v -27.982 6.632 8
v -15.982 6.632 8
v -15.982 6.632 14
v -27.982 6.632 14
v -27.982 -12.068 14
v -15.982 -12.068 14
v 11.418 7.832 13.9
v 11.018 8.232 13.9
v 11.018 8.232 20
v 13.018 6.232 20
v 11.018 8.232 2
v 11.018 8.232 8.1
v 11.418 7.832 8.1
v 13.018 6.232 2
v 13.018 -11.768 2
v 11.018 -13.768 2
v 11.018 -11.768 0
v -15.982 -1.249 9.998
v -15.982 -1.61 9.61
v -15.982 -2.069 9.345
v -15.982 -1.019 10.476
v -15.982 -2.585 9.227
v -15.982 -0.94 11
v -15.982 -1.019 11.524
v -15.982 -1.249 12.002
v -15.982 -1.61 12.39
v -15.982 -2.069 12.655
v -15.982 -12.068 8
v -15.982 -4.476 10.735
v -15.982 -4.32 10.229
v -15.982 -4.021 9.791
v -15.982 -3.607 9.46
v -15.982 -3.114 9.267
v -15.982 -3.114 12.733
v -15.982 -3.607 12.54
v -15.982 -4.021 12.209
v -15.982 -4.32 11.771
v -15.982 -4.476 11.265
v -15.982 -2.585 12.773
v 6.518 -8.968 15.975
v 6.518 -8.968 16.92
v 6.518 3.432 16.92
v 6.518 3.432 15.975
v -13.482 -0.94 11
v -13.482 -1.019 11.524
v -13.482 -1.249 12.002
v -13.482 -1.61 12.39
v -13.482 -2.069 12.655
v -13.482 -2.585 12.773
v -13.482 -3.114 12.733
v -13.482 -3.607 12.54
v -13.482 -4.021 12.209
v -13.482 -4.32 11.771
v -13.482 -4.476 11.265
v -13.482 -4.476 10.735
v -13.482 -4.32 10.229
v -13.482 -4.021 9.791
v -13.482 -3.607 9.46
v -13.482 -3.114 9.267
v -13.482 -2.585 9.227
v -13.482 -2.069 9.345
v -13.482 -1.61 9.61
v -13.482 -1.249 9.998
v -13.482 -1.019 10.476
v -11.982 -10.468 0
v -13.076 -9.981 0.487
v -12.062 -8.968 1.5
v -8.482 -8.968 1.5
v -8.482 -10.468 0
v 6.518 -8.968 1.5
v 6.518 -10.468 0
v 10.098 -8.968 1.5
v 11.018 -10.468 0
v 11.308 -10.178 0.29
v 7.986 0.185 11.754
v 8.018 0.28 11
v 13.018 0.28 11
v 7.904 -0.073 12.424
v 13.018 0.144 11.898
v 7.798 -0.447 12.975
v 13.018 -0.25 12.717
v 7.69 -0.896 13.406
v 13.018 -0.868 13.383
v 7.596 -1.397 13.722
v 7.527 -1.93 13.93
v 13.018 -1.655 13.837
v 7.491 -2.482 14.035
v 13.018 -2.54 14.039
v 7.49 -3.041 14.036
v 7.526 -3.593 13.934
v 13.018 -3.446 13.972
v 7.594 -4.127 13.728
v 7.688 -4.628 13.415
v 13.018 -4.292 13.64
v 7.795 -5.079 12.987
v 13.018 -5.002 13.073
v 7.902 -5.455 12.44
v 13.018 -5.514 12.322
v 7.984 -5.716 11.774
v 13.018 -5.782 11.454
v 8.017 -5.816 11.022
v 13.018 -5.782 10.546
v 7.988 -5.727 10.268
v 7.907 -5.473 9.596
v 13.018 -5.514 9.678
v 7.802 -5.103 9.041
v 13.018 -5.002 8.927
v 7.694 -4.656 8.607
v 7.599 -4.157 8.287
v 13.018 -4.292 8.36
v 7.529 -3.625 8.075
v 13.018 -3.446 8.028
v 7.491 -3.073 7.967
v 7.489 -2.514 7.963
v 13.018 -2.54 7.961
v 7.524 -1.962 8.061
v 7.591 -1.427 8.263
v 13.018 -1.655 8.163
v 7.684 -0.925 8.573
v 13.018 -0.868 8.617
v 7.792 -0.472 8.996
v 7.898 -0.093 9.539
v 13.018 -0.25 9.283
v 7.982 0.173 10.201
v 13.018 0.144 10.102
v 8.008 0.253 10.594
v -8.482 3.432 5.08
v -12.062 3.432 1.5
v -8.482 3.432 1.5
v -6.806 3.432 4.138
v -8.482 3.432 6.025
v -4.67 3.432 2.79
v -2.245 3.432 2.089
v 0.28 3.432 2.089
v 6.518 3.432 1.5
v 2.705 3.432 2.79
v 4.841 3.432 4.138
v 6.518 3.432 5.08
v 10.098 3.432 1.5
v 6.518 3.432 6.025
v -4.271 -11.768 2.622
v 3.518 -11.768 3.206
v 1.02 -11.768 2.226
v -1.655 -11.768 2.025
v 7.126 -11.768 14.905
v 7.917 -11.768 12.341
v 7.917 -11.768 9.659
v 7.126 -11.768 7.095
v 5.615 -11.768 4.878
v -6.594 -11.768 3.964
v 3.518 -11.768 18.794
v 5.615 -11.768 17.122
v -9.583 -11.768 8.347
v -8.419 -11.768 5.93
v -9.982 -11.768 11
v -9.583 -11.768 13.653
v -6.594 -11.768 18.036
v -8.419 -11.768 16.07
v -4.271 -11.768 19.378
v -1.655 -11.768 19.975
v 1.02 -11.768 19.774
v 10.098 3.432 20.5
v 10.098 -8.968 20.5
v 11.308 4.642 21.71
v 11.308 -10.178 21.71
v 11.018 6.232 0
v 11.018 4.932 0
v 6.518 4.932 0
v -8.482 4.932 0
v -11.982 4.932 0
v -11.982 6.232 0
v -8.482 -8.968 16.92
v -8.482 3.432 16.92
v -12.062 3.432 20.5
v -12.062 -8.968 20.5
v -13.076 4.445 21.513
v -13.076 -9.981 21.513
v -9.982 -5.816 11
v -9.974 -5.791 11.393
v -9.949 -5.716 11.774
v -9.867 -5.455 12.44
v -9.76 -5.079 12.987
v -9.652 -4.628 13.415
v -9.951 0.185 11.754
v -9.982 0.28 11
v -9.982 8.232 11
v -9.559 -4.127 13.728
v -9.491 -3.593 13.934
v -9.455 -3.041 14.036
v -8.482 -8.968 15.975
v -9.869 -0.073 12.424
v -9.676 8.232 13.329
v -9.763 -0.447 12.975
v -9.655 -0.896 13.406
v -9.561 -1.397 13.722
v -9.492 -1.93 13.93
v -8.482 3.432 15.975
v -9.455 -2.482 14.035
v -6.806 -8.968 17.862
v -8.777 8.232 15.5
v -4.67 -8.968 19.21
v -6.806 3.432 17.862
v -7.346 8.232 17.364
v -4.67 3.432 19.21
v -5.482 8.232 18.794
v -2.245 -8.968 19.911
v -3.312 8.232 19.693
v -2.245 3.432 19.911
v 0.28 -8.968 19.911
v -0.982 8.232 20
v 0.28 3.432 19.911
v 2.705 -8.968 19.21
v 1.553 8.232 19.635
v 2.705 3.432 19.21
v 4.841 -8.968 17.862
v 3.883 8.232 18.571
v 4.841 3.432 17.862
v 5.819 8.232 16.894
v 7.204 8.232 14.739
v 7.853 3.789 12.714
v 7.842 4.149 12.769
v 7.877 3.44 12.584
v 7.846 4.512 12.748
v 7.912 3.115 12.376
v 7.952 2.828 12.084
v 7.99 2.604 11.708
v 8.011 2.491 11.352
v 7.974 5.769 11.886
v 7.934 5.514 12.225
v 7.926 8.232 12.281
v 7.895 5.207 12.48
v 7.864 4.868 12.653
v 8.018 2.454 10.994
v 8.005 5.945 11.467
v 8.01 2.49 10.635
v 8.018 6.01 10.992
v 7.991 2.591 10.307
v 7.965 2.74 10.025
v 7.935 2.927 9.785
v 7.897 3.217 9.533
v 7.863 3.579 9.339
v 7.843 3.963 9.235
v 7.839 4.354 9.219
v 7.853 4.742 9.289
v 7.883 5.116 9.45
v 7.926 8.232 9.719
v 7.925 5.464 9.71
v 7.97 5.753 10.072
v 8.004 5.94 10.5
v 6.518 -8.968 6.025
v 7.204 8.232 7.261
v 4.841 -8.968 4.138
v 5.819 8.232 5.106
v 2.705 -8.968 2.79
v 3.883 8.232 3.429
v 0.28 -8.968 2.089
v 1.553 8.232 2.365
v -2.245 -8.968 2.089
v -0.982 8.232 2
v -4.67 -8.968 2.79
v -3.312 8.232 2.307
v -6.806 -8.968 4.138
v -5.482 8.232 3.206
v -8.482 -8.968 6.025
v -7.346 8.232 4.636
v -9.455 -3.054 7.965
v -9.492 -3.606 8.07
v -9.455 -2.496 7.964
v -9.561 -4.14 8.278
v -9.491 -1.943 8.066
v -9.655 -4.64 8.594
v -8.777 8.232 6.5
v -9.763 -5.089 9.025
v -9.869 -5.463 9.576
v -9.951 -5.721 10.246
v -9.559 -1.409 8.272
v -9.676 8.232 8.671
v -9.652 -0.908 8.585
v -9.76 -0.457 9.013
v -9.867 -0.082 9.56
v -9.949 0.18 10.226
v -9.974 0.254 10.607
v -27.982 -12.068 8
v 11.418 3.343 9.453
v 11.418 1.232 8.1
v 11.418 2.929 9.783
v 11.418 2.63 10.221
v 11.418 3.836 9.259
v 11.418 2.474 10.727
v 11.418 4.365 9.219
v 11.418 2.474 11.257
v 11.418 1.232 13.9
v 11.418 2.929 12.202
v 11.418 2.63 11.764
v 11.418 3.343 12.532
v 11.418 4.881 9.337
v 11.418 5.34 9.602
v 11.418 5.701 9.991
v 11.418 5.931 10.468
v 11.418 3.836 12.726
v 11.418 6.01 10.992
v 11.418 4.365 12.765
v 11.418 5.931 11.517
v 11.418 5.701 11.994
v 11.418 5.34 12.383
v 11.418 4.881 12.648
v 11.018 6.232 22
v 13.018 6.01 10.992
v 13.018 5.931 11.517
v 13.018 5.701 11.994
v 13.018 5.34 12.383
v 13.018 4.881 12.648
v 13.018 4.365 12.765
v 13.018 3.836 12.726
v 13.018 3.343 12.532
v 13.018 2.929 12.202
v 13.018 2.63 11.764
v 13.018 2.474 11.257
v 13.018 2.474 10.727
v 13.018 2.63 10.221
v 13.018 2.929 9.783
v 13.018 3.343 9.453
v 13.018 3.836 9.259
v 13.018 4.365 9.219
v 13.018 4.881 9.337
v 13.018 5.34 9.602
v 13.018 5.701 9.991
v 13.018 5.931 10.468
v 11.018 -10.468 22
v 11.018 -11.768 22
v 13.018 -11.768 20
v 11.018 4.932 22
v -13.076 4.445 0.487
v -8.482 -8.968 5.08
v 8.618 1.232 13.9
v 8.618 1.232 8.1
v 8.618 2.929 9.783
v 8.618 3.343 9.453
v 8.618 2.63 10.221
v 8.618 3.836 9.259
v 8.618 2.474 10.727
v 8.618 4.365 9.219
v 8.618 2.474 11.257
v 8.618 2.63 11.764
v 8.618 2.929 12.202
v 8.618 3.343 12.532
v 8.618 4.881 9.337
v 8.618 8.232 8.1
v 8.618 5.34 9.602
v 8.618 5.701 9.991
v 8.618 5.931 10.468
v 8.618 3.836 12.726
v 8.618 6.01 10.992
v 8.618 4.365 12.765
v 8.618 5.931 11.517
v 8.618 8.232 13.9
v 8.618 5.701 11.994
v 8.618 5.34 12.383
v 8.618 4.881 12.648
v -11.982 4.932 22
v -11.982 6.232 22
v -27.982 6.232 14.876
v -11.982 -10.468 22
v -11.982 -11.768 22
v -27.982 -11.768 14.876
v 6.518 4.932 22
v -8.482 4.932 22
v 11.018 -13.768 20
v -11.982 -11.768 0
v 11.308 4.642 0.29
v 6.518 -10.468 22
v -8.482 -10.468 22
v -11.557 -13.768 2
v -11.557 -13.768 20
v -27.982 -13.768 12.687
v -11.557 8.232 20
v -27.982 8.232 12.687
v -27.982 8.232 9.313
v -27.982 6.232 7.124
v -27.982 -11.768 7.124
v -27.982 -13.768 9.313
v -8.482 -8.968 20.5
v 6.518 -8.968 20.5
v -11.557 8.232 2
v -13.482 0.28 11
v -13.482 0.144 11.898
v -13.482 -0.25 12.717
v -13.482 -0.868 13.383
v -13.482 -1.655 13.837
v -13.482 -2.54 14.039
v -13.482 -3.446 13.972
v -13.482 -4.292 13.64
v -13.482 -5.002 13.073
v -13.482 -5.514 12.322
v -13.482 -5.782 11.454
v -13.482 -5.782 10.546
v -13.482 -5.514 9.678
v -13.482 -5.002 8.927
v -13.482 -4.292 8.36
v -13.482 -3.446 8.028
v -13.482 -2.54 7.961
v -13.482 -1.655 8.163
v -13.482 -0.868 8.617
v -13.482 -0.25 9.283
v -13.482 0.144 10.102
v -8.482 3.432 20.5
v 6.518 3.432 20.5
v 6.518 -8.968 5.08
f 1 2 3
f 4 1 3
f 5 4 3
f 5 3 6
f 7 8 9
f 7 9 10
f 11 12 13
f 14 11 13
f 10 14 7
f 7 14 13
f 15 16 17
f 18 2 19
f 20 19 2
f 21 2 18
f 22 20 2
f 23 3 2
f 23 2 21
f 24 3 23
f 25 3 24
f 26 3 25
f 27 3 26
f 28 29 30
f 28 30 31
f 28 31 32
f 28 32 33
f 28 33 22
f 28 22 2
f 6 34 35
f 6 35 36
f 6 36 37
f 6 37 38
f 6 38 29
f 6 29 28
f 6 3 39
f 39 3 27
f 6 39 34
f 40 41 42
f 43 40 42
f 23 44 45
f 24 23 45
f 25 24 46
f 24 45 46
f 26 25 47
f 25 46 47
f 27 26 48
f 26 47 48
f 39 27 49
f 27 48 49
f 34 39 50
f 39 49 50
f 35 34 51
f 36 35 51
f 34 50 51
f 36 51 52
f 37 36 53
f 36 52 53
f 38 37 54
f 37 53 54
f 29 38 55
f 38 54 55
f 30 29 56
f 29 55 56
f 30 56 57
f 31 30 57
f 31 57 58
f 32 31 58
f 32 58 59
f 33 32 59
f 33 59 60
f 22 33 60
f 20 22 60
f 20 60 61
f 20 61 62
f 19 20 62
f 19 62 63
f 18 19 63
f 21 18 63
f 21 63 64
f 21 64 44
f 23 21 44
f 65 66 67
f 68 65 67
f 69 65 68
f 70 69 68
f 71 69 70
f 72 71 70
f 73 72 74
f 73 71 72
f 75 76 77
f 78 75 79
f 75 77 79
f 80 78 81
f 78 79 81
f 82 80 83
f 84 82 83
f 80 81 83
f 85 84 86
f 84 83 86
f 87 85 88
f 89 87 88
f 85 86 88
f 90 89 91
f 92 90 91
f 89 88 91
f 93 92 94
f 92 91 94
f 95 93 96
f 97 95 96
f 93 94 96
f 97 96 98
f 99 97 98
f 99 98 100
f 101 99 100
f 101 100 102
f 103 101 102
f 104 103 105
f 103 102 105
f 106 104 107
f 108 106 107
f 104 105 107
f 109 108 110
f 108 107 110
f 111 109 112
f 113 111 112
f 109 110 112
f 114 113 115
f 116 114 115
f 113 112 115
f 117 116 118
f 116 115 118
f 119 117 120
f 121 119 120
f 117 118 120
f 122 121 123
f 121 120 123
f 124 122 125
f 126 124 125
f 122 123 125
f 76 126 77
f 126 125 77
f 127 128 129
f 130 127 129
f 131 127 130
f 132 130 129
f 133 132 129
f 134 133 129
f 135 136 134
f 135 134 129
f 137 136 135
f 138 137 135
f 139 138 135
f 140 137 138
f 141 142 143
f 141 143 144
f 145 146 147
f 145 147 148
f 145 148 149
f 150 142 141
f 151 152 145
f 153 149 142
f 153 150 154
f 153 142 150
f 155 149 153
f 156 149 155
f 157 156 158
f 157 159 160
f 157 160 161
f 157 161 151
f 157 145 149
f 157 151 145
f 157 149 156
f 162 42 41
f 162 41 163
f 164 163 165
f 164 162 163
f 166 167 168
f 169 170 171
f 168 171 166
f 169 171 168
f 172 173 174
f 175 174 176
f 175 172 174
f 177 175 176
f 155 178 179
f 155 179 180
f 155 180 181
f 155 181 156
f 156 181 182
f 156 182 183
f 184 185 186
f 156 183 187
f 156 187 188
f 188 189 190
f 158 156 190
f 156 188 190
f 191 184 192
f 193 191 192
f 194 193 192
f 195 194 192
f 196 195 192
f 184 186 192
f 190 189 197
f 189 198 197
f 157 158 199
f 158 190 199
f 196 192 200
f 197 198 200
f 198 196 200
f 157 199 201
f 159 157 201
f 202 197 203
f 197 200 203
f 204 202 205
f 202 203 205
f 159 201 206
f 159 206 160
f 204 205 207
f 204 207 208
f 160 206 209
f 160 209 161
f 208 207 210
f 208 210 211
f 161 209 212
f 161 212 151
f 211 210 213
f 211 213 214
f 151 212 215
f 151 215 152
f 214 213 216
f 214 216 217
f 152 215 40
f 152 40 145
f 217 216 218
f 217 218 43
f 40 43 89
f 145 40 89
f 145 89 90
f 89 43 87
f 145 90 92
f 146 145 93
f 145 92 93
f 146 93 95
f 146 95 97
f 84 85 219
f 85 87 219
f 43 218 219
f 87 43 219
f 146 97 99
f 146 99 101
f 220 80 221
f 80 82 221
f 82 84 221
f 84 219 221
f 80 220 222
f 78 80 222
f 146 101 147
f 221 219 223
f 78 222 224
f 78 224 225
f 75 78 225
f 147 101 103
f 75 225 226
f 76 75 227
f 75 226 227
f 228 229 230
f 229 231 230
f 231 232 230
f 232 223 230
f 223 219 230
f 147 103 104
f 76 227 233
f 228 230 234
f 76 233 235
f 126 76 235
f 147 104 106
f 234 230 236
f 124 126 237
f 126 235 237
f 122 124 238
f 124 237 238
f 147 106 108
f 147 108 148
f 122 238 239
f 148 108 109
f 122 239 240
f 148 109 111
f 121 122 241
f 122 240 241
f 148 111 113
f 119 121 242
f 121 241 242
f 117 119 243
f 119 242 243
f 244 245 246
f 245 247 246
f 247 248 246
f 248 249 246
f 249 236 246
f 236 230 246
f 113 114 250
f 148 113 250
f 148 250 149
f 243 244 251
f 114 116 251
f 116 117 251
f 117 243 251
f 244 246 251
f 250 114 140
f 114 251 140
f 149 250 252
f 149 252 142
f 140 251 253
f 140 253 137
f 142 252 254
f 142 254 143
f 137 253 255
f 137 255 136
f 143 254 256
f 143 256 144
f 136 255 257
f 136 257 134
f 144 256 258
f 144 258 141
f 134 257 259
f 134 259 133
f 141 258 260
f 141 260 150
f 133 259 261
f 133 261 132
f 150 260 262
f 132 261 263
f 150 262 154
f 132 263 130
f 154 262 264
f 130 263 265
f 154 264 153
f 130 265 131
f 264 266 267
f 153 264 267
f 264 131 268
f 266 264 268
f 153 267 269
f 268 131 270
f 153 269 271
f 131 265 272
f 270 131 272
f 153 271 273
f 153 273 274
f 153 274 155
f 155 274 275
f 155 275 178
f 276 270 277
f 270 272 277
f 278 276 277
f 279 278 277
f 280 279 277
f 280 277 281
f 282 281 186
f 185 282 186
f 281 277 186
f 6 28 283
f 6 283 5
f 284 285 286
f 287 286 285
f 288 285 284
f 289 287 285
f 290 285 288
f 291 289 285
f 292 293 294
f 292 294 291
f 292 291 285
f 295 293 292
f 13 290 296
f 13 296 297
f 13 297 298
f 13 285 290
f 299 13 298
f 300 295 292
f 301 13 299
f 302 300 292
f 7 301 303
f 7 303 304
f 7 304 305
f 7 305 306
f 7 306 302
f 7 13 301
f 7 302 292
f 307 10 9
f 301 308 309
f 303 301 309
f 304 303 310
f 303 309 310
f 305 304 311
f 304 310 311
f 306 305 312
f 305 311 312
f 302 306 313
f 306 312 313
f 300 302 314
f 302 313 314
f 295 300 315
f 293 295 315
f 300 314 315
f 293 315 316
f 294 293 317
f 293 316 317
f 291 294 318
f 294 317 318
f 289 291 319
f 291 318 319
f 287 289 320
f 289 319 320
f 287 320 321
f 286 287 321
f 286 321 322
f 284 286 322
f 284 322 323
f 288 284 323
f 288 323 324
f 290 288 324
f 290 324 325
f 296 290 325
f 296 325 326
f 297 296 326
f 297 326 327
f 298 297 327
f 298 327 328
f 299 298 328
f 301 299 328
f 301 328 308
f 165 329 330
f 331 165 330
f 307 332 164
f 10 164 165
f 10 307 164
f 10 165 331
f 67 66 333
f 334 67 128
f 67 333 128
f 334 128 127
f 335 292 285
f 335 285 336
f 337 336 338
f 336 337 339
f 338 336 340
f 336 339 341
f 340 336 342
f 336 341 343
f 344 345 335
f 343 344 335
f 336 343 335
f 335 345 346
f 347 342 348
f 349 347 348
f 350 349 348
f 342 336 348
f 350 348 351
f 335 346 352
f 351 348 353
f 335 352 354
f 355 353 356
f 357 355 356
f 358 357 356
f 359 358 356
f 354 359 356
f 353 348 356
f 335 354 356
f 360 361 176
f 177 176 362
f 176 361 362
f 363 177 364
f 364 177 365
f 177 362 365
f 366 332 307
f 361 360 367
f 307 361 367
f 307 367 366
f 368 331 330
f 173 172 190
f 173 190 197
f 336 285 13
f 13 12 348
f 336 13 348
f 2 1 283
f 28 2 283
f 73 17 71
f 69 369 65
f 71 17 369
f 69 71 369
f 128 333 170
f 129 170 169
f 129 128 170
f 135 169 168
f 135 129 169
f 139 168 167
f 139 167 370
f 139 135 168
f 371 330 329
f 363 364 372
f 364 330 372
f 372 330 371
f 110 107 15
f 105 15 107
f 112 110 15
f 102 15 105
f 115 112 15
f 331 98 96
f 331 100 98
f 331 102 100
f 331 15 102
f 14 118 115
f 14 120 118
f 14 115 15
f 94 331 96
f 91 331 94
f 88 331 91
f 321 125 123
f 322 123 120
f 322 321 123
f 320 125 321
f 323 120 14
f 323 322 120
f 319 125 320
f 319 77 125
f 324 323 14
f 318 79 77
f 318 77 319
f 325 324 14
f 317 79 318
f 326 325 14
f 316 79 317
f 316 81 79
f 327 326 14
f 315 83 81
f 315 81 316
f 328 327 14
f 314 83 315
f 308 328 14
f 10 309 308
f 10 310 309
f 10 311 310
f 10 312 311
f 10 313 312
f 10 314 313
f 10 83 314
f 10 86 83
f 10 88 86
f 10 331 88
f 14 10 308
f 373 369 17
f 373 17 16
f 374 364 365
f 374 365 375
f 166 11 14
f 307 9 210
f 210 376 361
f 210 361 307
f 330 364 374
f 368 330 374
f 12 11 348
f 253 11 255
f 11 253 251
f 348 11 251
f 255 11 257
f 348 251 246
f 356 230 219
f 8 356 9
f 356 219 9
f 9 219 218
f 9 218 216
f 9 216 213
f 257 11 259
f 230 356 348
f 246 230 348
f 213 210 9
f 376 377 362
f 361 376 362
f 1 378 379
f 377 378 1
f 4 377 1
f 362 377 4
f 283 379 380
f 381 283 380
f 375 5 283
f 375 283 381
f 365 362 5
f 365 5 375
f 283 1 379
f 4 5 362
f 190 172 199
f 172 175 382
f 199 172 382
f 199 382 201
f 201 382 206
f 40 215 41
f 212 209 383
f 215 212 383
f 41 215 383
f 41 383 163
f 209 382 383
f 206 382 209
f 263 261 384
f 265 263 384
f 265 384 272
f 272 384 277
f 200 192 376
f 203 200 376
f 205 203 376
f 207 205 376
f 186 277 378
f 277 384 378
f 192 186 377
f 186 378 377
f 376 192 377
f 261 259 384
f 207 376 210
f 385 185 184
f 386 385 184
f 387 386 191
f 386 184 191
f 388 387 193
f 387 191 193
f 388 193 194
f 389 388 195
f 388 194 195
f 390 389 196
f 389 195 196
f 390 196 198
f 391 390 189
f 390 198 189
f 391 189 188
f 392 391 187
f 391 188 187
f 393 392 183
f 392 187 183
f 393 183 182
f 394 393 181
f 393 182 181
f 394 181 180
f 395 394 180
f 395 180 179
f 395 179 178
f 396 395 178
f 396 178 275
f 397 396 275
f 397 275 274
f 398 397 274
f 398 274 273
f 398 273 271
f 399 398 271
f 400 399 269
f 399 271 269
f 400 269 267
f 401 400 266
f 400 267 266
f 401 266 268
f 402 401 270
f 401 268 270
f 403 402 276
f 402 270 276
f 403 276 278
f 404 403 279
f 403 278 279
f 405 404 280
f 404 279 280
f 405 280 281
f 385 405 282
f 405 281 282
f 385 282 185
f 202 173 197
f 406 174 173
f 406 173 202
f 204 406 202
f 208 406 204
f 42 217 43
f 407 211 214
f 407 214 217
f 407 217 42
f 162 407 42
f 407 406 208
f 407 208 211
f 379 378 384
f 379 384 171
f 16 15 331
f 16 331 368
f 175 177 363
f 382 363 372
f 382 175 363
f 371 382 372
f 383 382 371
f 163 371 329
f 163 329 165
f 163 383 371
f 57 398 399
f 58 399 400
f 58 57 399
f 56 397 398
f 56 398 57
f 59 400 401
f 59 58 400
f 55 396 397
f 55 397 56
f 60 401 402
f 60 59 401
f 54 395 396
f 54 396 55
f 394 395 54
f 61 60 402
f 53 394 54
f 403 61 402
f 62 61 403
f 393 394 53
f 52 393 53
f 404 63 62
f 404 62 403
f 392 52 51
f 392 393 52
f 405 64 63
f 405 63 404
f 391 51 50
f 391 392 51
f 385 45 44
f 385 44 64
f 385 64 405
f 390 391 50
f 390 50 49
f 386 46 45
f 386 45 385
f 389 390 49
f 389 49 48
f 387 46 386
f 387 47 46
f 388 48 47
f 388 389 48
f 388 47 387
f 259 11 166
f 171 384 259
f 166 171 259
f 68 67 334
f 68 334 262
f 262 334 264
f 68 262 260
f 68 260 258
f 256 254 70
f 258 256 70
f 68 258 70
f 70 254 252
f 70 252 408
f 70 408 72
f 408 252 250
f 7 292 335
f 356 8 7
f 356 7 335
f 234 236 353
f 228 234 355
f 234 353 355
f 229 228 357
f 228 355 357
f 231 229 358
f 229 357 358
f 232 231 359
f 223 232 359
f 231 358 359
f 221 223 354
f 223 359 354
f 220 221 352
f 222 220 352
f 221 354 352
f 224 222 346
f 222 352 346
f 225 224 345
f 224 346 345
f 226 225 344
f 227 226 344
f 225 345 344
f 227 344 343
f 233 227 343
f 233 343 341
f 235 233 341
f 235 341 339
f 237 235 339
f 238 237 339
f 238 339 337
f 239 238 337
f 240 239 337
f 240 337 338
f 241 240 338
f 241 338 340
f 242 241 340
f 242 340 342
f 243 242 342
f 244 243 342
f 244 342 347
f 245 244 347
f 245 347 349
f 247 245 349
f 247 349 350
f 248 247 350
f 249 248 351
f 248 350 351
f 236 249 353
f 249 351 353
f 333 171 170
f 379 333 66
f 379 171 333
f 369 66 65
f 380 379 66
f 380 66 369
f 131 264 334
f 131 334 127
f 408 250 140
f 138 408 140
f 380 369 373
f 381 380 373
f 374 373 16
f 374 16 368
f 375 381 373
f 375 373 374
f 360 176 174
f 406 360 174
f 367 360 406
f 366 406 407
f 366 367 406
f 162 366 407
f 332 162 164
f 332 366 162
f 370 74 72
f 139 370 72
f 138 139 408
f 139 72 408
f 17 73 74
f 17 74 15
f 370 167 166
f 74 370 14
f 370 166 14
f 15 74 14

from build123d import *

# Parameters (mm, degrees)
F0_W          = 26
F0_H          = 22
F1_DEPTH      = 22
F2_R          = 9
F3_DEPTH      = 20
F4_W          = 15
F4_H          = 12.4
F5_DEPTH      = 22.001
F6_W          = 22
F6_H          = 22
F7_DEPTH      = 14
F8_W          = 18.7
F8_H          = 6
F9_DEPTH      = 12
F10_R         = 1.778
F11_DEPTH     = 40.001
F12_SIZE      = 1.5
F13_SIZE2     = 7.1236589649
F13_SIZE      = 16
F13_2_SIZE2   = 7.1236589649
F13_2_SIZE    = 16
F14_T1_DEPTH  = 27.800912408
F14_T3_DEPTH  = 27.800912408
F15_W         = 2.8
F15_H         = 5.8
F16_DEPTH     = 7
F17_W         = 22
F17_H         = 22
F18_DEPTH     = 1
F19_R         = 3.048
F20_DEPTH     = 26.5
F21_R         = 1.778
F22_DEPTH     = 6
F23_T1_DEPTH  = 2.5403411844
F23_T3_DEPTH  = 2.5403411844
F23_T5_DEPTH  = 2.5403411844
F23_T7_DEPTH  = 2.5403411844
F23_T9_DEPTH  = 32.2867319519
F23_T11_DEPTH = 32.2867319519
F23_T13_DEPTH = 30.3695452806
F24_T4_DEPTH  = 41.5282991577
F24_T10_DEPTH = 41.5282991577
F24_T16_DEPTH = 41.5282991577
F24_T22_DEPTH = 41.5282991577
F24_T28_DEPTH = 41.5282991577
F24_T34_DEPTH = 41.5282991577
F24_T40_DEPTH = 41.5282991577
F24_T46_DEPTH = 41.5282991577


# Not quite as in the source:
# - a fillet or chamfer that OpenCascade refuses, or shapes differently, is made with other operations: its cross-section is extruded or revolved along the edge and cut away or added


with BuildPart() as f1:
    # F0 (on Top) → F1 (new body)
    with BuildSketch(Plane.XY):
        with Locations((-0.9824799188, -2.7680952549)):
            Rectangle(F0_W, F0_H)
    extrude(amount=F1_DEPTH)

    # F2 (on face) → F3 (cut)
    with BuildSketch(Plane(origin=(0, 8.2319047451, 0), x_dir=(-1, 0, 0), z_dir=(0, 1, 0))):
        with Locations((0.9824799188, 11)):
            Circle(F2_R)
    extrude(amount=-F3_DEPTH, mode=Mode.SUBTRACT)

    # F4 (on face) → F5 (cut, through all)
    with BuildSketch(Plane.XY.offset(22)):
        with Locations((-0.9824799188, -2.7680952549)):
            Rectangle(F4_W, F4_H)
    extrude(amount=-F5_DEPTH, mode=Mode.SUBTRACT)

    # F6 (on face) → F7 (join)
    with BuildSketch(Plane(origin=(-13.9824799188, 0, 0), x_dir=(0, -1, 0), z_dir=(-1, 0, 0))):
        with Locations((2.7680952549, 11)):
            Rectangle(F6_W, F6_H)
    extrude(amount=F7_DEPTH)

    # F8 (on face) → F9 (cut)
    with BuildSketch(Plane(origin=(-27.9824799188, 0, 0), x_dir=(0, -1, 0), z_dir=(-1, 0, 0))):
        with Locations((2.7180952549, 11)):
            Rectangle(F8_W, F8_H)
    extrude(amount=-F9_DEPTH, mode=Mode.SUBTRACT)

    # F10 (on face) → F11 (cut, through all)
    with BuildSketch(Plane.YZ.offset(12.0175200812)):
        with Locations((-2.7180952549, 11)):
            Circle(F10_R)
    extrude(amount=-F11_DEPTH, mode=Mode.SUBTRACT)

    # F12
    f12_edges = [f1.edges().sort_by_distance(p)[0] for p in [
        (-0.98248, 3.431905, 22),
        (-0.98248, -8.968095, 22),
        (-0.98248, 3.431905, 0),
        (-0.98248, -8.968095, 0),
    ]]
    chamfer(f12_edges, length=F12_SIZE)

    # F13
    f13_edges = [f1.edges().sort_by_distance(p)[0] for p in [
        (-27.98248, -2.768095, 22),
    ]]
    f13_side = f1.faces().sort_by_distance((-10.474005, -2.768095, 22))[0]
    chamfer(f13_edges, length=F13_SIZE, length2=F13_SIZE2, reference=f13_side)

    # F13#2
    f13_2_edges = [f1.edges().sort_by_distance(p)[0] for p in [
        (-27.98248, -2.768095, 0),
    ]]
    f13_2_side = f1.faces().sort_by_distance((-10.474005, -2.768095, 0))[0]
    chamfer(f13_2_edges, length=F13_2_SIZE, length2=F13_2_SIZE2, reference=f13_2_side)

    # F14: chamfer of 2 on 4 edges, made by hand

    # F14_s2 → F14_t1 (cut)
    with BuildSketch(Plane(origin=(2.8731297183, 0, 1.2791997672), x_dir=(0, 1, 0), z_dir=(-0.9135454576, 0, -0.4067366431))):
        Polygon((8.2319047451, -22.971713726), (6.2319047451, -24.971713726), (8.2319047451, -24.971713726), align=None)
        Polygon((-11.7680952549, -24.971713726), (-13.7680952549, -22.971713726), (-13.7680952549, -24.971713726), align=None)
    extrude(amount=F14_T1_DEPTH, mode=Mode.SUBTRACT)

    # F14_s4 → F14_t3 (cut)
    with BuildSketch(Plane(origin=(-5.301463362, 0, 2.3603635629), x_dir=(0, 1, 0), z_dir=(-0.9135454576, 0, 0.4067366431))):
        Polygon((8.2319047451, 2.8737136579), (6.2319047451, 4.8737136579), (8.2319047451, 4.8737136579), align=None)
        Polygon((-11.7680952549, 4.8737136579), (-13.7680952549, 2.8737136579), (-13.7680952549, 4.8737136579), align=None)
    extrude(amount=F14_T3_DEPTH, mode=Mode.SUBTRACT)

    # F15 (on face) → F16 (cut)
    with BuildSketch(Plane(origin=(0, 8.2319047451, 0), x_dir=(-1, 0, 0), z_dir=(0, 1, 0))):
        with Locations((-10.0175200812, 11)):
            Rectangle(F15_W, F15_H)
    extrude(amount=-F16_DEPTH, mode=Mode.SUBTRACT)

    # F17 (on face) → F18 (join)
    with BuildSketch(Plane.YZ.offset(12.0175200812)):
        with Locations((-2.7680952549, 11)):
            Rectangle(F17_W, F17_H)
    extrude(amount=F18_DEPTH)

    # F19 (on face) → F20 (cut)
    with BuildSketch(Plane.YZ.offset(13.0175200812)):
        with Locations((-2.7680952549, 11)):
            Circle(F19_R)
    extrude(amount=-F20_DEPTH, mode=Mode.SUBTRACT)

    # F21 (on face) → F22 (cut)
    with BuildSketch(Plane.YZ.offset(13.0175200812)):
        with Locations((4.2319047451, 10.9924701974)):
            Circle(F21_R)
    extrude(amount=-F22_DEPTH, mode=Mode.SUBTRACT)

    # F23: chamfer of 2 on 8 edges, made by hand

    # F23_s2 → F23_t1 (cut)
    with BuildSketch(Plane(origin=(7.595205112, -7.595205112, -7.595205112), x_dir=(0.7071067812, 0.7071067812, 0), z_dir=(0.5773502692, -0.5773502692, -0.5773502692))):
        Polygon((-0.5307367951, 9.3021885081), (0.8834767672, 11.7516782509), (-1.9449503575, 11.7516782509), align=None)
    extrude(amount=F23_T1_DEPTH, mode=Mode.SUBTRACT)

    # F23_s4 → F23_t3 (cut)
    with BuildSketch(Plane(origin=(5.7498082754, 5.7498082754, -5.7498082754), x_dir=(-0.7071067812, 0.7071067812, 0), z_dir=(0.5773502692, 0.5773502692, -0.5773502692))):
        Polygon((-1.9697274939, 9.4915379396), (-3.3839410563, 7.0420481968), (-4.7981546187, 9.4915379396), align=None)
    extrude(amount=F23_T3_DEPTH, mode=Mode.SUBTRACT)

    # F23_s6 → F23_t5 (cut)
    with BuildSketch(Plane(origin=(13.0831416088, 13.0831416088, 13.0831416088), x_dir=(-0.7071067812, 0.7071067812, 0), z_dir=(0.5773502692, 0.5773502692, 0.5773502692))):
        Polygon((-1.9697274939, 8.4713868408), (-3.3839410563, 10.9208765836), (-4.7981546187, 8.4713868408), align=None)
    extrude(amount=F23_T5_DEPTH, mode=Mode.SUBTRACT)

    # F23_s8 → F23_t7 (cut)
    with BuildSketch(Plane(origin=(14.9285384454, -14.9285384454, 14.9285384454), x_dir=(0.7071067812, 0.7071067812, 0), z_dir=(0.5773502692, -0.5773502692, 0.5773502692))):
        Polygon((-0.5307367951, 8.6607362723), (0.8834767672, 6.2112465295), (-1.9449503575, 6.2112465295), align=None)
    extrude(amount=F23_T7_DEPTH, mode=Mode.SUBTRACT)

    # F23_s10 → F23_t9 (cut)
    with BuildSketch(Plane.XZ.offset(-13.375270721)):
        Polygon((11.0175200812, 0), (13.0175200812, 2), (13.0175200812, 0), align=None)
        Polygon((11.0175200812, 22), (13.0175200812, 20), (13.0175200812, 22), align=None)
    extrude(amount=F23_T9_DEPTH, mode=Mode.SUBTRACT)

    # F23_s12 → F23_t11 (cut)
    with BuildSketch(Plane.XY.offset(-5.1433659759)):
        Polygon((11.0175200812, 8.2319047451), (13.0175200812, 6.2319047451), (13.0175200812, 8.2319047451), align=None)
        Polygon((13.0175200812, -11.7680952549), (11.0175200812, -13.7680952549), (13.0175200812, -13.7680952549), align=None)
    extrude(amount=F23_T11_DEPTH, mode=Mode.SUBTRACT)

    # F23_s14 → F23_t13 (cut)
    with BuildSketch(Plane.YZ.offset(-12.2086592235)):
        Polygon((8.2319047451, 20), (6.2319047451, 22), (8.2319047451, 22), align=None)
        Polygon((-11.7680952549, 22), (-13.7680952549, 20), (-13.7680952549, 22), align=None)
        Polygon((-11.7680952549, 0), (-13.7680952549, 2), (-13.7680952549, 0), align=None)
        Polygon((8.2319047451, 2), (6.2319047451, 0), (8.2319047451, 0), align=None)
    extrude(amount=F23_T13_DEPTH, mode=Mode.SUBTRACT)

    # F24: chamfer of 5.08 on 4 edges, made by hand


with BuildPart() as f24_tool2:
    # F24_s3 → F24_t4 (new body)
    with BuildSketch(Plane.XZ.offset(23.5322448338)):
        Polygon((-8.4824799188, 16.92), (-13.5624799188, 22), (-8.4824799188, 22), align=None)
    extrude(amount=-F24_T4_DEPTH)

    split(bisect_by=Plane(origin=(0, 5.7659523726, 5.7659523726), x_dir=(1, 0, 0), z_dir=(0, 0.7071067812, 0.7071067812)), keep=Keep.TOP)

    split(bisect_by=Plane(origin=(0, -8.5340476274, 8.5340476274), x_dir=(1, 0, 0), z_dir=(0, -0.7071067812, 0.7071067812)), keep=Keep.TOP)


with BuildPart() as f1_1:
    add(f1.part)

    # F24_t1: cut F24_tool2
    add(f24_tool2.part, mode=Mode.SUBTRACT)


with BuildPart() as f24_tool8:
    # F24_s9 → F24_t10 (new body)
    with BuildSketch(Plane.XZ.offset(23.5322448338)):
        Polygon((-8.4824799188, 16.92), (-13.5624799188, 22), (-8.4824799188, 22), align=None)
    extrude(amount=-F24_T10_DEPTH)

    split(bisect_by=Plane.XZ.offset(8.9680952549), keep=Keep.BOTTOM)

    split(bisect_by=Plane.XZ.offset(-3.4319047451), keep=Keep.TOP)


with BuildPart() as f1_2:
    add(f1_1.part)

    # F24_t7: cut F24_tool8
    add(f24_tool8.part, mode=Mode.SUBTRACT)


with BuildPart() as f24_tool14:
    # F24_s15 → F24_t16 (new body)
    with BuildSketch(Plane.XZ.offset(-17.996054324)):
        Polygon((6.5175200812, 16.92), (11.5975200812, 22), (6.5175200812, 22), align=None)
    extrude(amount=F24_T16_DEPTH)

    split(bisect_by=Plane(origin=(0, 5.7659523726, 5.7659523726), x_dir=(1, 0, 0), z_dir=(0, 0.7071067812, 0.7071067812)), keep=Keep.TOP)

    split(bisect_by=Plane(origin=(0, -8.5340476274, 8.5340476274), x_dir=(1, 0, 0), z_dir=(0, -0.7071067812, 0.7071067812)), keep=Keep.TOP)


with BuildPart() as f1_3:
    add(f1_2.part)

    # F24_t13: cut F24_tool14
    add(f24_tool14.part, mode=Mode.SUBTRACT)


with BuildPart() as f24_tool20:
    # F24_s21 → F24_t22 (new body)
    with BuildSketch(Plane.XZ.offset(-17.996054324)):
        Polygon((6.5175200812, 16.92), (11.5975200812, 22), (6.5175200812, 22), align=None)
    extrude(amount=F24_T22_DEPTH)

    split(bisect_by=Plane.XZ.offset(8.9680952549), keep=Keep.BOTTOM)

    split(bisect_by=Plane.XZ.offset(-3.4319047451), keep=Keep.TOP)


with BuildPart() as f1_4:
    add(f1_3.part)

    # F24_t19: cut F24_tool20
    add(f24_tool20.part, mode=Mode.SUBTRACT)


with BuildPart() as f24_tool26:
    # F24_s27 → F24_t28 (new body)
    with BuildSketch(Plane.XZ.offset(23.5322448338)):
        Polygon((11.5975200812, 0), (6.5175200812, 5.08), (6.5175200812, 0), align=None)
    extrude(amount=-F24_T28_DEPTH)

    split(bisect_by=Plane.XZ.offset(8.9680952549), keep=Keep.BOTTOM)

    split(bisect_by=Plane(origin=(0, 2.4659523726, 2.4659523726), x_dir=(1, 0, 0), z_dir=(0, -0.7071067812, -0.7071067812)), keep=Keep.TOP)


with BuildPart() as f1_5:
    add(f1_4.part)

    # F24_t25: cut F24_tool26
    add(f24_tool26.part, mode=Mode.SUBTRACT)


with BuildPart() as f24_tool32:
    # F24_s33 → F24_t34 (new body)
    with BuildSketch(Plane.XZ.offset(23.5322448338)):
        Polygon((11.5975200812, 0), (6.5175200812, 5.08), (6.5175200812, 0), align=None)
    extrude(amount=-F24_T34_DEPTH)

    split(bisect_by=Plane.XZ.offset(-3.4319047451), keep=Keep.TOP)

    split(bisect_by=Plane(origin=(0, -5.2340476274, 5.2340476274), x_dir=(1, 0, 0), z_dir=(0, 0.7071067812, -0.7071067812)), keep=Keep.TOP)


with BuildPart() as f1_6:
    add(f1_5.part)

    # F24_t31: cut F24_tool32
    add(f24_tool32.part, mode=Mode.SUBTRACT)


with BuildPart() as f24_tool38:
    # F24_s39 → F24_t40 (new body)
    with BuildSketch(Plane.XZ.offset(-17.996054324)):
        Polygon((-13.5624799188, 0), (-8.4824799188, 5.08), (-8.4824799188, 0), align=None)
    extrude(amount=F24_T40_DEPTH)

    split(bisect_by=Plane.XZ.offset(-3.4319047451), keep=Keep.TOP)

    split(bisect_by=Plane(origin=(0, -5.2340476274, 5.2340476274), x_dir=(1, 0, 0), z_dir=(0, 0.7071067812, -0.7071067812)), keep=Keep.TOP)


with BuildPart() as f1_7:
    add(f1_6.part)

    # F24_t37: cut F24_tool38
    add(f24_tool38.part, mode=Mode.SUBTRACT)


with BuildPart() as f24_tool44:
    # F24_s45 → F24_t46 (new body)
    with BuildSketch(Plane.XZ.offset(-17.996054324)):
        Polygon((-13.5624799188, 0), (-8.4824799188, 5.08), (-8.4824799188, 0), align=None)
    extrude(amount=F24_T46_DEPTH)

    split(bisect_by=Plane.XZ.offset(8.9680952549), keep=Keep.BOTTOM)

    split(bisect_by=Plane(origin=(0, 2.4659523726, 2.4659523726), x_dir=(1, 0, 0), z_dir=(0, -0.7071067812, -0.7071067812)), keep=Keep.TOP)


with BuildPart() as f1_8:
    add(f1_7.part)

    # F24_t43: cut F24_tool44
    add(f24_tool44.part, mode=Mode.SUBTRACT)


solid = f1_8.part
